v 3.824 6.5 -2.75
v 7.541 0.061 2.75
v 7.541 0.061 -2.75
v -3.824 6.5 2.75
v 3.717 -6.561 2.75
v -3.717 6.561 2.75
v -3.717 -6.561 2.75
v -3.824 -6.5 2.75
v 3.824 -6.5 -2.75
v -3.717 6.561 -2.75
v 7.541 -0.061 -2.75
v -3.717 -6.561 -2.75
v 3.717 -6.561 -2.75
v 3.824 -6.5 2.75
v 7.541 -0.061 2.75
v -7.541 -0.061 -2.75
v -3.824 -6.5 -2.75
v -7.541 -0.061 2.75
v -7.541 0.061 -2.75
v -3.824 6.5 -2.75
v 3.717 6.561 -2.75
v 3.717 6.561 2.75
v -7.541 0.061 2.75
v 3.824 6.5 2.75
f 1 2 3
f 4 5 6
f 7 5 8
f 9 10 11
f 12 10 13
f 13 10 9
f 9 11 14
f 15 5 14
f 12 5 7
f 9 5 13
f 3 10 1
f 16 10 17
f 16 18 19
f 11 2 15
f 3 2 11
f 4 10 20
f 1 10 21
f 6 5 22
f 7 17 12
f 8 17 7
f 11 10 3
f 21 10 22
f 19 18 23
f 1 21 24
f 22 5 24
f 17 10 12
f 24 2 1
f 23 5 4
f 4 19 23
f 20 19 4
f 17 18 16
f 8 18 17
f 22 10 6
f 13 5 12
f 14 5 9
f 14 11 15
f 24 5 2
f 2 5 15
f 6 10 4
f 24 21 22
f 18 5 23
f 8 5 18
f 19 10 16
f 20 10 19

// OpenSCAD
//phex(5,0.1,5);
fhex(13,5.5);

module phex(wid,rad,height){
hull(){
translate([wid/2-rad,0,0])cylinder(r=rad,h=height);
rotate([0,0,60])translate([wid/2-rad,0,0])cylinder(r=rad,h=height);
rotate([0,0,120])translate([wid/2-rad,0,0])cylinder(r=rad,h=height);
rotate([0,0,180])translate([wid/2-rad,0,0])cylinder(r=rad,h=height);
rotate([0,0,240])translate([wid/2-rad,0,0])cylinder(r=rad,h=height);
rotate([0,0,300])translate([wid/2-rad,0,0])cylinder(r=rad,h=height);

}
}

module fhex(wid,height){
hull(){
cube([wid/1.7,wid,height],center = true);
rotate([0,0,120])cube([wid/1.7,wid,height],center = true);
rotate([0,0,240])cube([wid/1.7,wid,height],center = true);
}
}
